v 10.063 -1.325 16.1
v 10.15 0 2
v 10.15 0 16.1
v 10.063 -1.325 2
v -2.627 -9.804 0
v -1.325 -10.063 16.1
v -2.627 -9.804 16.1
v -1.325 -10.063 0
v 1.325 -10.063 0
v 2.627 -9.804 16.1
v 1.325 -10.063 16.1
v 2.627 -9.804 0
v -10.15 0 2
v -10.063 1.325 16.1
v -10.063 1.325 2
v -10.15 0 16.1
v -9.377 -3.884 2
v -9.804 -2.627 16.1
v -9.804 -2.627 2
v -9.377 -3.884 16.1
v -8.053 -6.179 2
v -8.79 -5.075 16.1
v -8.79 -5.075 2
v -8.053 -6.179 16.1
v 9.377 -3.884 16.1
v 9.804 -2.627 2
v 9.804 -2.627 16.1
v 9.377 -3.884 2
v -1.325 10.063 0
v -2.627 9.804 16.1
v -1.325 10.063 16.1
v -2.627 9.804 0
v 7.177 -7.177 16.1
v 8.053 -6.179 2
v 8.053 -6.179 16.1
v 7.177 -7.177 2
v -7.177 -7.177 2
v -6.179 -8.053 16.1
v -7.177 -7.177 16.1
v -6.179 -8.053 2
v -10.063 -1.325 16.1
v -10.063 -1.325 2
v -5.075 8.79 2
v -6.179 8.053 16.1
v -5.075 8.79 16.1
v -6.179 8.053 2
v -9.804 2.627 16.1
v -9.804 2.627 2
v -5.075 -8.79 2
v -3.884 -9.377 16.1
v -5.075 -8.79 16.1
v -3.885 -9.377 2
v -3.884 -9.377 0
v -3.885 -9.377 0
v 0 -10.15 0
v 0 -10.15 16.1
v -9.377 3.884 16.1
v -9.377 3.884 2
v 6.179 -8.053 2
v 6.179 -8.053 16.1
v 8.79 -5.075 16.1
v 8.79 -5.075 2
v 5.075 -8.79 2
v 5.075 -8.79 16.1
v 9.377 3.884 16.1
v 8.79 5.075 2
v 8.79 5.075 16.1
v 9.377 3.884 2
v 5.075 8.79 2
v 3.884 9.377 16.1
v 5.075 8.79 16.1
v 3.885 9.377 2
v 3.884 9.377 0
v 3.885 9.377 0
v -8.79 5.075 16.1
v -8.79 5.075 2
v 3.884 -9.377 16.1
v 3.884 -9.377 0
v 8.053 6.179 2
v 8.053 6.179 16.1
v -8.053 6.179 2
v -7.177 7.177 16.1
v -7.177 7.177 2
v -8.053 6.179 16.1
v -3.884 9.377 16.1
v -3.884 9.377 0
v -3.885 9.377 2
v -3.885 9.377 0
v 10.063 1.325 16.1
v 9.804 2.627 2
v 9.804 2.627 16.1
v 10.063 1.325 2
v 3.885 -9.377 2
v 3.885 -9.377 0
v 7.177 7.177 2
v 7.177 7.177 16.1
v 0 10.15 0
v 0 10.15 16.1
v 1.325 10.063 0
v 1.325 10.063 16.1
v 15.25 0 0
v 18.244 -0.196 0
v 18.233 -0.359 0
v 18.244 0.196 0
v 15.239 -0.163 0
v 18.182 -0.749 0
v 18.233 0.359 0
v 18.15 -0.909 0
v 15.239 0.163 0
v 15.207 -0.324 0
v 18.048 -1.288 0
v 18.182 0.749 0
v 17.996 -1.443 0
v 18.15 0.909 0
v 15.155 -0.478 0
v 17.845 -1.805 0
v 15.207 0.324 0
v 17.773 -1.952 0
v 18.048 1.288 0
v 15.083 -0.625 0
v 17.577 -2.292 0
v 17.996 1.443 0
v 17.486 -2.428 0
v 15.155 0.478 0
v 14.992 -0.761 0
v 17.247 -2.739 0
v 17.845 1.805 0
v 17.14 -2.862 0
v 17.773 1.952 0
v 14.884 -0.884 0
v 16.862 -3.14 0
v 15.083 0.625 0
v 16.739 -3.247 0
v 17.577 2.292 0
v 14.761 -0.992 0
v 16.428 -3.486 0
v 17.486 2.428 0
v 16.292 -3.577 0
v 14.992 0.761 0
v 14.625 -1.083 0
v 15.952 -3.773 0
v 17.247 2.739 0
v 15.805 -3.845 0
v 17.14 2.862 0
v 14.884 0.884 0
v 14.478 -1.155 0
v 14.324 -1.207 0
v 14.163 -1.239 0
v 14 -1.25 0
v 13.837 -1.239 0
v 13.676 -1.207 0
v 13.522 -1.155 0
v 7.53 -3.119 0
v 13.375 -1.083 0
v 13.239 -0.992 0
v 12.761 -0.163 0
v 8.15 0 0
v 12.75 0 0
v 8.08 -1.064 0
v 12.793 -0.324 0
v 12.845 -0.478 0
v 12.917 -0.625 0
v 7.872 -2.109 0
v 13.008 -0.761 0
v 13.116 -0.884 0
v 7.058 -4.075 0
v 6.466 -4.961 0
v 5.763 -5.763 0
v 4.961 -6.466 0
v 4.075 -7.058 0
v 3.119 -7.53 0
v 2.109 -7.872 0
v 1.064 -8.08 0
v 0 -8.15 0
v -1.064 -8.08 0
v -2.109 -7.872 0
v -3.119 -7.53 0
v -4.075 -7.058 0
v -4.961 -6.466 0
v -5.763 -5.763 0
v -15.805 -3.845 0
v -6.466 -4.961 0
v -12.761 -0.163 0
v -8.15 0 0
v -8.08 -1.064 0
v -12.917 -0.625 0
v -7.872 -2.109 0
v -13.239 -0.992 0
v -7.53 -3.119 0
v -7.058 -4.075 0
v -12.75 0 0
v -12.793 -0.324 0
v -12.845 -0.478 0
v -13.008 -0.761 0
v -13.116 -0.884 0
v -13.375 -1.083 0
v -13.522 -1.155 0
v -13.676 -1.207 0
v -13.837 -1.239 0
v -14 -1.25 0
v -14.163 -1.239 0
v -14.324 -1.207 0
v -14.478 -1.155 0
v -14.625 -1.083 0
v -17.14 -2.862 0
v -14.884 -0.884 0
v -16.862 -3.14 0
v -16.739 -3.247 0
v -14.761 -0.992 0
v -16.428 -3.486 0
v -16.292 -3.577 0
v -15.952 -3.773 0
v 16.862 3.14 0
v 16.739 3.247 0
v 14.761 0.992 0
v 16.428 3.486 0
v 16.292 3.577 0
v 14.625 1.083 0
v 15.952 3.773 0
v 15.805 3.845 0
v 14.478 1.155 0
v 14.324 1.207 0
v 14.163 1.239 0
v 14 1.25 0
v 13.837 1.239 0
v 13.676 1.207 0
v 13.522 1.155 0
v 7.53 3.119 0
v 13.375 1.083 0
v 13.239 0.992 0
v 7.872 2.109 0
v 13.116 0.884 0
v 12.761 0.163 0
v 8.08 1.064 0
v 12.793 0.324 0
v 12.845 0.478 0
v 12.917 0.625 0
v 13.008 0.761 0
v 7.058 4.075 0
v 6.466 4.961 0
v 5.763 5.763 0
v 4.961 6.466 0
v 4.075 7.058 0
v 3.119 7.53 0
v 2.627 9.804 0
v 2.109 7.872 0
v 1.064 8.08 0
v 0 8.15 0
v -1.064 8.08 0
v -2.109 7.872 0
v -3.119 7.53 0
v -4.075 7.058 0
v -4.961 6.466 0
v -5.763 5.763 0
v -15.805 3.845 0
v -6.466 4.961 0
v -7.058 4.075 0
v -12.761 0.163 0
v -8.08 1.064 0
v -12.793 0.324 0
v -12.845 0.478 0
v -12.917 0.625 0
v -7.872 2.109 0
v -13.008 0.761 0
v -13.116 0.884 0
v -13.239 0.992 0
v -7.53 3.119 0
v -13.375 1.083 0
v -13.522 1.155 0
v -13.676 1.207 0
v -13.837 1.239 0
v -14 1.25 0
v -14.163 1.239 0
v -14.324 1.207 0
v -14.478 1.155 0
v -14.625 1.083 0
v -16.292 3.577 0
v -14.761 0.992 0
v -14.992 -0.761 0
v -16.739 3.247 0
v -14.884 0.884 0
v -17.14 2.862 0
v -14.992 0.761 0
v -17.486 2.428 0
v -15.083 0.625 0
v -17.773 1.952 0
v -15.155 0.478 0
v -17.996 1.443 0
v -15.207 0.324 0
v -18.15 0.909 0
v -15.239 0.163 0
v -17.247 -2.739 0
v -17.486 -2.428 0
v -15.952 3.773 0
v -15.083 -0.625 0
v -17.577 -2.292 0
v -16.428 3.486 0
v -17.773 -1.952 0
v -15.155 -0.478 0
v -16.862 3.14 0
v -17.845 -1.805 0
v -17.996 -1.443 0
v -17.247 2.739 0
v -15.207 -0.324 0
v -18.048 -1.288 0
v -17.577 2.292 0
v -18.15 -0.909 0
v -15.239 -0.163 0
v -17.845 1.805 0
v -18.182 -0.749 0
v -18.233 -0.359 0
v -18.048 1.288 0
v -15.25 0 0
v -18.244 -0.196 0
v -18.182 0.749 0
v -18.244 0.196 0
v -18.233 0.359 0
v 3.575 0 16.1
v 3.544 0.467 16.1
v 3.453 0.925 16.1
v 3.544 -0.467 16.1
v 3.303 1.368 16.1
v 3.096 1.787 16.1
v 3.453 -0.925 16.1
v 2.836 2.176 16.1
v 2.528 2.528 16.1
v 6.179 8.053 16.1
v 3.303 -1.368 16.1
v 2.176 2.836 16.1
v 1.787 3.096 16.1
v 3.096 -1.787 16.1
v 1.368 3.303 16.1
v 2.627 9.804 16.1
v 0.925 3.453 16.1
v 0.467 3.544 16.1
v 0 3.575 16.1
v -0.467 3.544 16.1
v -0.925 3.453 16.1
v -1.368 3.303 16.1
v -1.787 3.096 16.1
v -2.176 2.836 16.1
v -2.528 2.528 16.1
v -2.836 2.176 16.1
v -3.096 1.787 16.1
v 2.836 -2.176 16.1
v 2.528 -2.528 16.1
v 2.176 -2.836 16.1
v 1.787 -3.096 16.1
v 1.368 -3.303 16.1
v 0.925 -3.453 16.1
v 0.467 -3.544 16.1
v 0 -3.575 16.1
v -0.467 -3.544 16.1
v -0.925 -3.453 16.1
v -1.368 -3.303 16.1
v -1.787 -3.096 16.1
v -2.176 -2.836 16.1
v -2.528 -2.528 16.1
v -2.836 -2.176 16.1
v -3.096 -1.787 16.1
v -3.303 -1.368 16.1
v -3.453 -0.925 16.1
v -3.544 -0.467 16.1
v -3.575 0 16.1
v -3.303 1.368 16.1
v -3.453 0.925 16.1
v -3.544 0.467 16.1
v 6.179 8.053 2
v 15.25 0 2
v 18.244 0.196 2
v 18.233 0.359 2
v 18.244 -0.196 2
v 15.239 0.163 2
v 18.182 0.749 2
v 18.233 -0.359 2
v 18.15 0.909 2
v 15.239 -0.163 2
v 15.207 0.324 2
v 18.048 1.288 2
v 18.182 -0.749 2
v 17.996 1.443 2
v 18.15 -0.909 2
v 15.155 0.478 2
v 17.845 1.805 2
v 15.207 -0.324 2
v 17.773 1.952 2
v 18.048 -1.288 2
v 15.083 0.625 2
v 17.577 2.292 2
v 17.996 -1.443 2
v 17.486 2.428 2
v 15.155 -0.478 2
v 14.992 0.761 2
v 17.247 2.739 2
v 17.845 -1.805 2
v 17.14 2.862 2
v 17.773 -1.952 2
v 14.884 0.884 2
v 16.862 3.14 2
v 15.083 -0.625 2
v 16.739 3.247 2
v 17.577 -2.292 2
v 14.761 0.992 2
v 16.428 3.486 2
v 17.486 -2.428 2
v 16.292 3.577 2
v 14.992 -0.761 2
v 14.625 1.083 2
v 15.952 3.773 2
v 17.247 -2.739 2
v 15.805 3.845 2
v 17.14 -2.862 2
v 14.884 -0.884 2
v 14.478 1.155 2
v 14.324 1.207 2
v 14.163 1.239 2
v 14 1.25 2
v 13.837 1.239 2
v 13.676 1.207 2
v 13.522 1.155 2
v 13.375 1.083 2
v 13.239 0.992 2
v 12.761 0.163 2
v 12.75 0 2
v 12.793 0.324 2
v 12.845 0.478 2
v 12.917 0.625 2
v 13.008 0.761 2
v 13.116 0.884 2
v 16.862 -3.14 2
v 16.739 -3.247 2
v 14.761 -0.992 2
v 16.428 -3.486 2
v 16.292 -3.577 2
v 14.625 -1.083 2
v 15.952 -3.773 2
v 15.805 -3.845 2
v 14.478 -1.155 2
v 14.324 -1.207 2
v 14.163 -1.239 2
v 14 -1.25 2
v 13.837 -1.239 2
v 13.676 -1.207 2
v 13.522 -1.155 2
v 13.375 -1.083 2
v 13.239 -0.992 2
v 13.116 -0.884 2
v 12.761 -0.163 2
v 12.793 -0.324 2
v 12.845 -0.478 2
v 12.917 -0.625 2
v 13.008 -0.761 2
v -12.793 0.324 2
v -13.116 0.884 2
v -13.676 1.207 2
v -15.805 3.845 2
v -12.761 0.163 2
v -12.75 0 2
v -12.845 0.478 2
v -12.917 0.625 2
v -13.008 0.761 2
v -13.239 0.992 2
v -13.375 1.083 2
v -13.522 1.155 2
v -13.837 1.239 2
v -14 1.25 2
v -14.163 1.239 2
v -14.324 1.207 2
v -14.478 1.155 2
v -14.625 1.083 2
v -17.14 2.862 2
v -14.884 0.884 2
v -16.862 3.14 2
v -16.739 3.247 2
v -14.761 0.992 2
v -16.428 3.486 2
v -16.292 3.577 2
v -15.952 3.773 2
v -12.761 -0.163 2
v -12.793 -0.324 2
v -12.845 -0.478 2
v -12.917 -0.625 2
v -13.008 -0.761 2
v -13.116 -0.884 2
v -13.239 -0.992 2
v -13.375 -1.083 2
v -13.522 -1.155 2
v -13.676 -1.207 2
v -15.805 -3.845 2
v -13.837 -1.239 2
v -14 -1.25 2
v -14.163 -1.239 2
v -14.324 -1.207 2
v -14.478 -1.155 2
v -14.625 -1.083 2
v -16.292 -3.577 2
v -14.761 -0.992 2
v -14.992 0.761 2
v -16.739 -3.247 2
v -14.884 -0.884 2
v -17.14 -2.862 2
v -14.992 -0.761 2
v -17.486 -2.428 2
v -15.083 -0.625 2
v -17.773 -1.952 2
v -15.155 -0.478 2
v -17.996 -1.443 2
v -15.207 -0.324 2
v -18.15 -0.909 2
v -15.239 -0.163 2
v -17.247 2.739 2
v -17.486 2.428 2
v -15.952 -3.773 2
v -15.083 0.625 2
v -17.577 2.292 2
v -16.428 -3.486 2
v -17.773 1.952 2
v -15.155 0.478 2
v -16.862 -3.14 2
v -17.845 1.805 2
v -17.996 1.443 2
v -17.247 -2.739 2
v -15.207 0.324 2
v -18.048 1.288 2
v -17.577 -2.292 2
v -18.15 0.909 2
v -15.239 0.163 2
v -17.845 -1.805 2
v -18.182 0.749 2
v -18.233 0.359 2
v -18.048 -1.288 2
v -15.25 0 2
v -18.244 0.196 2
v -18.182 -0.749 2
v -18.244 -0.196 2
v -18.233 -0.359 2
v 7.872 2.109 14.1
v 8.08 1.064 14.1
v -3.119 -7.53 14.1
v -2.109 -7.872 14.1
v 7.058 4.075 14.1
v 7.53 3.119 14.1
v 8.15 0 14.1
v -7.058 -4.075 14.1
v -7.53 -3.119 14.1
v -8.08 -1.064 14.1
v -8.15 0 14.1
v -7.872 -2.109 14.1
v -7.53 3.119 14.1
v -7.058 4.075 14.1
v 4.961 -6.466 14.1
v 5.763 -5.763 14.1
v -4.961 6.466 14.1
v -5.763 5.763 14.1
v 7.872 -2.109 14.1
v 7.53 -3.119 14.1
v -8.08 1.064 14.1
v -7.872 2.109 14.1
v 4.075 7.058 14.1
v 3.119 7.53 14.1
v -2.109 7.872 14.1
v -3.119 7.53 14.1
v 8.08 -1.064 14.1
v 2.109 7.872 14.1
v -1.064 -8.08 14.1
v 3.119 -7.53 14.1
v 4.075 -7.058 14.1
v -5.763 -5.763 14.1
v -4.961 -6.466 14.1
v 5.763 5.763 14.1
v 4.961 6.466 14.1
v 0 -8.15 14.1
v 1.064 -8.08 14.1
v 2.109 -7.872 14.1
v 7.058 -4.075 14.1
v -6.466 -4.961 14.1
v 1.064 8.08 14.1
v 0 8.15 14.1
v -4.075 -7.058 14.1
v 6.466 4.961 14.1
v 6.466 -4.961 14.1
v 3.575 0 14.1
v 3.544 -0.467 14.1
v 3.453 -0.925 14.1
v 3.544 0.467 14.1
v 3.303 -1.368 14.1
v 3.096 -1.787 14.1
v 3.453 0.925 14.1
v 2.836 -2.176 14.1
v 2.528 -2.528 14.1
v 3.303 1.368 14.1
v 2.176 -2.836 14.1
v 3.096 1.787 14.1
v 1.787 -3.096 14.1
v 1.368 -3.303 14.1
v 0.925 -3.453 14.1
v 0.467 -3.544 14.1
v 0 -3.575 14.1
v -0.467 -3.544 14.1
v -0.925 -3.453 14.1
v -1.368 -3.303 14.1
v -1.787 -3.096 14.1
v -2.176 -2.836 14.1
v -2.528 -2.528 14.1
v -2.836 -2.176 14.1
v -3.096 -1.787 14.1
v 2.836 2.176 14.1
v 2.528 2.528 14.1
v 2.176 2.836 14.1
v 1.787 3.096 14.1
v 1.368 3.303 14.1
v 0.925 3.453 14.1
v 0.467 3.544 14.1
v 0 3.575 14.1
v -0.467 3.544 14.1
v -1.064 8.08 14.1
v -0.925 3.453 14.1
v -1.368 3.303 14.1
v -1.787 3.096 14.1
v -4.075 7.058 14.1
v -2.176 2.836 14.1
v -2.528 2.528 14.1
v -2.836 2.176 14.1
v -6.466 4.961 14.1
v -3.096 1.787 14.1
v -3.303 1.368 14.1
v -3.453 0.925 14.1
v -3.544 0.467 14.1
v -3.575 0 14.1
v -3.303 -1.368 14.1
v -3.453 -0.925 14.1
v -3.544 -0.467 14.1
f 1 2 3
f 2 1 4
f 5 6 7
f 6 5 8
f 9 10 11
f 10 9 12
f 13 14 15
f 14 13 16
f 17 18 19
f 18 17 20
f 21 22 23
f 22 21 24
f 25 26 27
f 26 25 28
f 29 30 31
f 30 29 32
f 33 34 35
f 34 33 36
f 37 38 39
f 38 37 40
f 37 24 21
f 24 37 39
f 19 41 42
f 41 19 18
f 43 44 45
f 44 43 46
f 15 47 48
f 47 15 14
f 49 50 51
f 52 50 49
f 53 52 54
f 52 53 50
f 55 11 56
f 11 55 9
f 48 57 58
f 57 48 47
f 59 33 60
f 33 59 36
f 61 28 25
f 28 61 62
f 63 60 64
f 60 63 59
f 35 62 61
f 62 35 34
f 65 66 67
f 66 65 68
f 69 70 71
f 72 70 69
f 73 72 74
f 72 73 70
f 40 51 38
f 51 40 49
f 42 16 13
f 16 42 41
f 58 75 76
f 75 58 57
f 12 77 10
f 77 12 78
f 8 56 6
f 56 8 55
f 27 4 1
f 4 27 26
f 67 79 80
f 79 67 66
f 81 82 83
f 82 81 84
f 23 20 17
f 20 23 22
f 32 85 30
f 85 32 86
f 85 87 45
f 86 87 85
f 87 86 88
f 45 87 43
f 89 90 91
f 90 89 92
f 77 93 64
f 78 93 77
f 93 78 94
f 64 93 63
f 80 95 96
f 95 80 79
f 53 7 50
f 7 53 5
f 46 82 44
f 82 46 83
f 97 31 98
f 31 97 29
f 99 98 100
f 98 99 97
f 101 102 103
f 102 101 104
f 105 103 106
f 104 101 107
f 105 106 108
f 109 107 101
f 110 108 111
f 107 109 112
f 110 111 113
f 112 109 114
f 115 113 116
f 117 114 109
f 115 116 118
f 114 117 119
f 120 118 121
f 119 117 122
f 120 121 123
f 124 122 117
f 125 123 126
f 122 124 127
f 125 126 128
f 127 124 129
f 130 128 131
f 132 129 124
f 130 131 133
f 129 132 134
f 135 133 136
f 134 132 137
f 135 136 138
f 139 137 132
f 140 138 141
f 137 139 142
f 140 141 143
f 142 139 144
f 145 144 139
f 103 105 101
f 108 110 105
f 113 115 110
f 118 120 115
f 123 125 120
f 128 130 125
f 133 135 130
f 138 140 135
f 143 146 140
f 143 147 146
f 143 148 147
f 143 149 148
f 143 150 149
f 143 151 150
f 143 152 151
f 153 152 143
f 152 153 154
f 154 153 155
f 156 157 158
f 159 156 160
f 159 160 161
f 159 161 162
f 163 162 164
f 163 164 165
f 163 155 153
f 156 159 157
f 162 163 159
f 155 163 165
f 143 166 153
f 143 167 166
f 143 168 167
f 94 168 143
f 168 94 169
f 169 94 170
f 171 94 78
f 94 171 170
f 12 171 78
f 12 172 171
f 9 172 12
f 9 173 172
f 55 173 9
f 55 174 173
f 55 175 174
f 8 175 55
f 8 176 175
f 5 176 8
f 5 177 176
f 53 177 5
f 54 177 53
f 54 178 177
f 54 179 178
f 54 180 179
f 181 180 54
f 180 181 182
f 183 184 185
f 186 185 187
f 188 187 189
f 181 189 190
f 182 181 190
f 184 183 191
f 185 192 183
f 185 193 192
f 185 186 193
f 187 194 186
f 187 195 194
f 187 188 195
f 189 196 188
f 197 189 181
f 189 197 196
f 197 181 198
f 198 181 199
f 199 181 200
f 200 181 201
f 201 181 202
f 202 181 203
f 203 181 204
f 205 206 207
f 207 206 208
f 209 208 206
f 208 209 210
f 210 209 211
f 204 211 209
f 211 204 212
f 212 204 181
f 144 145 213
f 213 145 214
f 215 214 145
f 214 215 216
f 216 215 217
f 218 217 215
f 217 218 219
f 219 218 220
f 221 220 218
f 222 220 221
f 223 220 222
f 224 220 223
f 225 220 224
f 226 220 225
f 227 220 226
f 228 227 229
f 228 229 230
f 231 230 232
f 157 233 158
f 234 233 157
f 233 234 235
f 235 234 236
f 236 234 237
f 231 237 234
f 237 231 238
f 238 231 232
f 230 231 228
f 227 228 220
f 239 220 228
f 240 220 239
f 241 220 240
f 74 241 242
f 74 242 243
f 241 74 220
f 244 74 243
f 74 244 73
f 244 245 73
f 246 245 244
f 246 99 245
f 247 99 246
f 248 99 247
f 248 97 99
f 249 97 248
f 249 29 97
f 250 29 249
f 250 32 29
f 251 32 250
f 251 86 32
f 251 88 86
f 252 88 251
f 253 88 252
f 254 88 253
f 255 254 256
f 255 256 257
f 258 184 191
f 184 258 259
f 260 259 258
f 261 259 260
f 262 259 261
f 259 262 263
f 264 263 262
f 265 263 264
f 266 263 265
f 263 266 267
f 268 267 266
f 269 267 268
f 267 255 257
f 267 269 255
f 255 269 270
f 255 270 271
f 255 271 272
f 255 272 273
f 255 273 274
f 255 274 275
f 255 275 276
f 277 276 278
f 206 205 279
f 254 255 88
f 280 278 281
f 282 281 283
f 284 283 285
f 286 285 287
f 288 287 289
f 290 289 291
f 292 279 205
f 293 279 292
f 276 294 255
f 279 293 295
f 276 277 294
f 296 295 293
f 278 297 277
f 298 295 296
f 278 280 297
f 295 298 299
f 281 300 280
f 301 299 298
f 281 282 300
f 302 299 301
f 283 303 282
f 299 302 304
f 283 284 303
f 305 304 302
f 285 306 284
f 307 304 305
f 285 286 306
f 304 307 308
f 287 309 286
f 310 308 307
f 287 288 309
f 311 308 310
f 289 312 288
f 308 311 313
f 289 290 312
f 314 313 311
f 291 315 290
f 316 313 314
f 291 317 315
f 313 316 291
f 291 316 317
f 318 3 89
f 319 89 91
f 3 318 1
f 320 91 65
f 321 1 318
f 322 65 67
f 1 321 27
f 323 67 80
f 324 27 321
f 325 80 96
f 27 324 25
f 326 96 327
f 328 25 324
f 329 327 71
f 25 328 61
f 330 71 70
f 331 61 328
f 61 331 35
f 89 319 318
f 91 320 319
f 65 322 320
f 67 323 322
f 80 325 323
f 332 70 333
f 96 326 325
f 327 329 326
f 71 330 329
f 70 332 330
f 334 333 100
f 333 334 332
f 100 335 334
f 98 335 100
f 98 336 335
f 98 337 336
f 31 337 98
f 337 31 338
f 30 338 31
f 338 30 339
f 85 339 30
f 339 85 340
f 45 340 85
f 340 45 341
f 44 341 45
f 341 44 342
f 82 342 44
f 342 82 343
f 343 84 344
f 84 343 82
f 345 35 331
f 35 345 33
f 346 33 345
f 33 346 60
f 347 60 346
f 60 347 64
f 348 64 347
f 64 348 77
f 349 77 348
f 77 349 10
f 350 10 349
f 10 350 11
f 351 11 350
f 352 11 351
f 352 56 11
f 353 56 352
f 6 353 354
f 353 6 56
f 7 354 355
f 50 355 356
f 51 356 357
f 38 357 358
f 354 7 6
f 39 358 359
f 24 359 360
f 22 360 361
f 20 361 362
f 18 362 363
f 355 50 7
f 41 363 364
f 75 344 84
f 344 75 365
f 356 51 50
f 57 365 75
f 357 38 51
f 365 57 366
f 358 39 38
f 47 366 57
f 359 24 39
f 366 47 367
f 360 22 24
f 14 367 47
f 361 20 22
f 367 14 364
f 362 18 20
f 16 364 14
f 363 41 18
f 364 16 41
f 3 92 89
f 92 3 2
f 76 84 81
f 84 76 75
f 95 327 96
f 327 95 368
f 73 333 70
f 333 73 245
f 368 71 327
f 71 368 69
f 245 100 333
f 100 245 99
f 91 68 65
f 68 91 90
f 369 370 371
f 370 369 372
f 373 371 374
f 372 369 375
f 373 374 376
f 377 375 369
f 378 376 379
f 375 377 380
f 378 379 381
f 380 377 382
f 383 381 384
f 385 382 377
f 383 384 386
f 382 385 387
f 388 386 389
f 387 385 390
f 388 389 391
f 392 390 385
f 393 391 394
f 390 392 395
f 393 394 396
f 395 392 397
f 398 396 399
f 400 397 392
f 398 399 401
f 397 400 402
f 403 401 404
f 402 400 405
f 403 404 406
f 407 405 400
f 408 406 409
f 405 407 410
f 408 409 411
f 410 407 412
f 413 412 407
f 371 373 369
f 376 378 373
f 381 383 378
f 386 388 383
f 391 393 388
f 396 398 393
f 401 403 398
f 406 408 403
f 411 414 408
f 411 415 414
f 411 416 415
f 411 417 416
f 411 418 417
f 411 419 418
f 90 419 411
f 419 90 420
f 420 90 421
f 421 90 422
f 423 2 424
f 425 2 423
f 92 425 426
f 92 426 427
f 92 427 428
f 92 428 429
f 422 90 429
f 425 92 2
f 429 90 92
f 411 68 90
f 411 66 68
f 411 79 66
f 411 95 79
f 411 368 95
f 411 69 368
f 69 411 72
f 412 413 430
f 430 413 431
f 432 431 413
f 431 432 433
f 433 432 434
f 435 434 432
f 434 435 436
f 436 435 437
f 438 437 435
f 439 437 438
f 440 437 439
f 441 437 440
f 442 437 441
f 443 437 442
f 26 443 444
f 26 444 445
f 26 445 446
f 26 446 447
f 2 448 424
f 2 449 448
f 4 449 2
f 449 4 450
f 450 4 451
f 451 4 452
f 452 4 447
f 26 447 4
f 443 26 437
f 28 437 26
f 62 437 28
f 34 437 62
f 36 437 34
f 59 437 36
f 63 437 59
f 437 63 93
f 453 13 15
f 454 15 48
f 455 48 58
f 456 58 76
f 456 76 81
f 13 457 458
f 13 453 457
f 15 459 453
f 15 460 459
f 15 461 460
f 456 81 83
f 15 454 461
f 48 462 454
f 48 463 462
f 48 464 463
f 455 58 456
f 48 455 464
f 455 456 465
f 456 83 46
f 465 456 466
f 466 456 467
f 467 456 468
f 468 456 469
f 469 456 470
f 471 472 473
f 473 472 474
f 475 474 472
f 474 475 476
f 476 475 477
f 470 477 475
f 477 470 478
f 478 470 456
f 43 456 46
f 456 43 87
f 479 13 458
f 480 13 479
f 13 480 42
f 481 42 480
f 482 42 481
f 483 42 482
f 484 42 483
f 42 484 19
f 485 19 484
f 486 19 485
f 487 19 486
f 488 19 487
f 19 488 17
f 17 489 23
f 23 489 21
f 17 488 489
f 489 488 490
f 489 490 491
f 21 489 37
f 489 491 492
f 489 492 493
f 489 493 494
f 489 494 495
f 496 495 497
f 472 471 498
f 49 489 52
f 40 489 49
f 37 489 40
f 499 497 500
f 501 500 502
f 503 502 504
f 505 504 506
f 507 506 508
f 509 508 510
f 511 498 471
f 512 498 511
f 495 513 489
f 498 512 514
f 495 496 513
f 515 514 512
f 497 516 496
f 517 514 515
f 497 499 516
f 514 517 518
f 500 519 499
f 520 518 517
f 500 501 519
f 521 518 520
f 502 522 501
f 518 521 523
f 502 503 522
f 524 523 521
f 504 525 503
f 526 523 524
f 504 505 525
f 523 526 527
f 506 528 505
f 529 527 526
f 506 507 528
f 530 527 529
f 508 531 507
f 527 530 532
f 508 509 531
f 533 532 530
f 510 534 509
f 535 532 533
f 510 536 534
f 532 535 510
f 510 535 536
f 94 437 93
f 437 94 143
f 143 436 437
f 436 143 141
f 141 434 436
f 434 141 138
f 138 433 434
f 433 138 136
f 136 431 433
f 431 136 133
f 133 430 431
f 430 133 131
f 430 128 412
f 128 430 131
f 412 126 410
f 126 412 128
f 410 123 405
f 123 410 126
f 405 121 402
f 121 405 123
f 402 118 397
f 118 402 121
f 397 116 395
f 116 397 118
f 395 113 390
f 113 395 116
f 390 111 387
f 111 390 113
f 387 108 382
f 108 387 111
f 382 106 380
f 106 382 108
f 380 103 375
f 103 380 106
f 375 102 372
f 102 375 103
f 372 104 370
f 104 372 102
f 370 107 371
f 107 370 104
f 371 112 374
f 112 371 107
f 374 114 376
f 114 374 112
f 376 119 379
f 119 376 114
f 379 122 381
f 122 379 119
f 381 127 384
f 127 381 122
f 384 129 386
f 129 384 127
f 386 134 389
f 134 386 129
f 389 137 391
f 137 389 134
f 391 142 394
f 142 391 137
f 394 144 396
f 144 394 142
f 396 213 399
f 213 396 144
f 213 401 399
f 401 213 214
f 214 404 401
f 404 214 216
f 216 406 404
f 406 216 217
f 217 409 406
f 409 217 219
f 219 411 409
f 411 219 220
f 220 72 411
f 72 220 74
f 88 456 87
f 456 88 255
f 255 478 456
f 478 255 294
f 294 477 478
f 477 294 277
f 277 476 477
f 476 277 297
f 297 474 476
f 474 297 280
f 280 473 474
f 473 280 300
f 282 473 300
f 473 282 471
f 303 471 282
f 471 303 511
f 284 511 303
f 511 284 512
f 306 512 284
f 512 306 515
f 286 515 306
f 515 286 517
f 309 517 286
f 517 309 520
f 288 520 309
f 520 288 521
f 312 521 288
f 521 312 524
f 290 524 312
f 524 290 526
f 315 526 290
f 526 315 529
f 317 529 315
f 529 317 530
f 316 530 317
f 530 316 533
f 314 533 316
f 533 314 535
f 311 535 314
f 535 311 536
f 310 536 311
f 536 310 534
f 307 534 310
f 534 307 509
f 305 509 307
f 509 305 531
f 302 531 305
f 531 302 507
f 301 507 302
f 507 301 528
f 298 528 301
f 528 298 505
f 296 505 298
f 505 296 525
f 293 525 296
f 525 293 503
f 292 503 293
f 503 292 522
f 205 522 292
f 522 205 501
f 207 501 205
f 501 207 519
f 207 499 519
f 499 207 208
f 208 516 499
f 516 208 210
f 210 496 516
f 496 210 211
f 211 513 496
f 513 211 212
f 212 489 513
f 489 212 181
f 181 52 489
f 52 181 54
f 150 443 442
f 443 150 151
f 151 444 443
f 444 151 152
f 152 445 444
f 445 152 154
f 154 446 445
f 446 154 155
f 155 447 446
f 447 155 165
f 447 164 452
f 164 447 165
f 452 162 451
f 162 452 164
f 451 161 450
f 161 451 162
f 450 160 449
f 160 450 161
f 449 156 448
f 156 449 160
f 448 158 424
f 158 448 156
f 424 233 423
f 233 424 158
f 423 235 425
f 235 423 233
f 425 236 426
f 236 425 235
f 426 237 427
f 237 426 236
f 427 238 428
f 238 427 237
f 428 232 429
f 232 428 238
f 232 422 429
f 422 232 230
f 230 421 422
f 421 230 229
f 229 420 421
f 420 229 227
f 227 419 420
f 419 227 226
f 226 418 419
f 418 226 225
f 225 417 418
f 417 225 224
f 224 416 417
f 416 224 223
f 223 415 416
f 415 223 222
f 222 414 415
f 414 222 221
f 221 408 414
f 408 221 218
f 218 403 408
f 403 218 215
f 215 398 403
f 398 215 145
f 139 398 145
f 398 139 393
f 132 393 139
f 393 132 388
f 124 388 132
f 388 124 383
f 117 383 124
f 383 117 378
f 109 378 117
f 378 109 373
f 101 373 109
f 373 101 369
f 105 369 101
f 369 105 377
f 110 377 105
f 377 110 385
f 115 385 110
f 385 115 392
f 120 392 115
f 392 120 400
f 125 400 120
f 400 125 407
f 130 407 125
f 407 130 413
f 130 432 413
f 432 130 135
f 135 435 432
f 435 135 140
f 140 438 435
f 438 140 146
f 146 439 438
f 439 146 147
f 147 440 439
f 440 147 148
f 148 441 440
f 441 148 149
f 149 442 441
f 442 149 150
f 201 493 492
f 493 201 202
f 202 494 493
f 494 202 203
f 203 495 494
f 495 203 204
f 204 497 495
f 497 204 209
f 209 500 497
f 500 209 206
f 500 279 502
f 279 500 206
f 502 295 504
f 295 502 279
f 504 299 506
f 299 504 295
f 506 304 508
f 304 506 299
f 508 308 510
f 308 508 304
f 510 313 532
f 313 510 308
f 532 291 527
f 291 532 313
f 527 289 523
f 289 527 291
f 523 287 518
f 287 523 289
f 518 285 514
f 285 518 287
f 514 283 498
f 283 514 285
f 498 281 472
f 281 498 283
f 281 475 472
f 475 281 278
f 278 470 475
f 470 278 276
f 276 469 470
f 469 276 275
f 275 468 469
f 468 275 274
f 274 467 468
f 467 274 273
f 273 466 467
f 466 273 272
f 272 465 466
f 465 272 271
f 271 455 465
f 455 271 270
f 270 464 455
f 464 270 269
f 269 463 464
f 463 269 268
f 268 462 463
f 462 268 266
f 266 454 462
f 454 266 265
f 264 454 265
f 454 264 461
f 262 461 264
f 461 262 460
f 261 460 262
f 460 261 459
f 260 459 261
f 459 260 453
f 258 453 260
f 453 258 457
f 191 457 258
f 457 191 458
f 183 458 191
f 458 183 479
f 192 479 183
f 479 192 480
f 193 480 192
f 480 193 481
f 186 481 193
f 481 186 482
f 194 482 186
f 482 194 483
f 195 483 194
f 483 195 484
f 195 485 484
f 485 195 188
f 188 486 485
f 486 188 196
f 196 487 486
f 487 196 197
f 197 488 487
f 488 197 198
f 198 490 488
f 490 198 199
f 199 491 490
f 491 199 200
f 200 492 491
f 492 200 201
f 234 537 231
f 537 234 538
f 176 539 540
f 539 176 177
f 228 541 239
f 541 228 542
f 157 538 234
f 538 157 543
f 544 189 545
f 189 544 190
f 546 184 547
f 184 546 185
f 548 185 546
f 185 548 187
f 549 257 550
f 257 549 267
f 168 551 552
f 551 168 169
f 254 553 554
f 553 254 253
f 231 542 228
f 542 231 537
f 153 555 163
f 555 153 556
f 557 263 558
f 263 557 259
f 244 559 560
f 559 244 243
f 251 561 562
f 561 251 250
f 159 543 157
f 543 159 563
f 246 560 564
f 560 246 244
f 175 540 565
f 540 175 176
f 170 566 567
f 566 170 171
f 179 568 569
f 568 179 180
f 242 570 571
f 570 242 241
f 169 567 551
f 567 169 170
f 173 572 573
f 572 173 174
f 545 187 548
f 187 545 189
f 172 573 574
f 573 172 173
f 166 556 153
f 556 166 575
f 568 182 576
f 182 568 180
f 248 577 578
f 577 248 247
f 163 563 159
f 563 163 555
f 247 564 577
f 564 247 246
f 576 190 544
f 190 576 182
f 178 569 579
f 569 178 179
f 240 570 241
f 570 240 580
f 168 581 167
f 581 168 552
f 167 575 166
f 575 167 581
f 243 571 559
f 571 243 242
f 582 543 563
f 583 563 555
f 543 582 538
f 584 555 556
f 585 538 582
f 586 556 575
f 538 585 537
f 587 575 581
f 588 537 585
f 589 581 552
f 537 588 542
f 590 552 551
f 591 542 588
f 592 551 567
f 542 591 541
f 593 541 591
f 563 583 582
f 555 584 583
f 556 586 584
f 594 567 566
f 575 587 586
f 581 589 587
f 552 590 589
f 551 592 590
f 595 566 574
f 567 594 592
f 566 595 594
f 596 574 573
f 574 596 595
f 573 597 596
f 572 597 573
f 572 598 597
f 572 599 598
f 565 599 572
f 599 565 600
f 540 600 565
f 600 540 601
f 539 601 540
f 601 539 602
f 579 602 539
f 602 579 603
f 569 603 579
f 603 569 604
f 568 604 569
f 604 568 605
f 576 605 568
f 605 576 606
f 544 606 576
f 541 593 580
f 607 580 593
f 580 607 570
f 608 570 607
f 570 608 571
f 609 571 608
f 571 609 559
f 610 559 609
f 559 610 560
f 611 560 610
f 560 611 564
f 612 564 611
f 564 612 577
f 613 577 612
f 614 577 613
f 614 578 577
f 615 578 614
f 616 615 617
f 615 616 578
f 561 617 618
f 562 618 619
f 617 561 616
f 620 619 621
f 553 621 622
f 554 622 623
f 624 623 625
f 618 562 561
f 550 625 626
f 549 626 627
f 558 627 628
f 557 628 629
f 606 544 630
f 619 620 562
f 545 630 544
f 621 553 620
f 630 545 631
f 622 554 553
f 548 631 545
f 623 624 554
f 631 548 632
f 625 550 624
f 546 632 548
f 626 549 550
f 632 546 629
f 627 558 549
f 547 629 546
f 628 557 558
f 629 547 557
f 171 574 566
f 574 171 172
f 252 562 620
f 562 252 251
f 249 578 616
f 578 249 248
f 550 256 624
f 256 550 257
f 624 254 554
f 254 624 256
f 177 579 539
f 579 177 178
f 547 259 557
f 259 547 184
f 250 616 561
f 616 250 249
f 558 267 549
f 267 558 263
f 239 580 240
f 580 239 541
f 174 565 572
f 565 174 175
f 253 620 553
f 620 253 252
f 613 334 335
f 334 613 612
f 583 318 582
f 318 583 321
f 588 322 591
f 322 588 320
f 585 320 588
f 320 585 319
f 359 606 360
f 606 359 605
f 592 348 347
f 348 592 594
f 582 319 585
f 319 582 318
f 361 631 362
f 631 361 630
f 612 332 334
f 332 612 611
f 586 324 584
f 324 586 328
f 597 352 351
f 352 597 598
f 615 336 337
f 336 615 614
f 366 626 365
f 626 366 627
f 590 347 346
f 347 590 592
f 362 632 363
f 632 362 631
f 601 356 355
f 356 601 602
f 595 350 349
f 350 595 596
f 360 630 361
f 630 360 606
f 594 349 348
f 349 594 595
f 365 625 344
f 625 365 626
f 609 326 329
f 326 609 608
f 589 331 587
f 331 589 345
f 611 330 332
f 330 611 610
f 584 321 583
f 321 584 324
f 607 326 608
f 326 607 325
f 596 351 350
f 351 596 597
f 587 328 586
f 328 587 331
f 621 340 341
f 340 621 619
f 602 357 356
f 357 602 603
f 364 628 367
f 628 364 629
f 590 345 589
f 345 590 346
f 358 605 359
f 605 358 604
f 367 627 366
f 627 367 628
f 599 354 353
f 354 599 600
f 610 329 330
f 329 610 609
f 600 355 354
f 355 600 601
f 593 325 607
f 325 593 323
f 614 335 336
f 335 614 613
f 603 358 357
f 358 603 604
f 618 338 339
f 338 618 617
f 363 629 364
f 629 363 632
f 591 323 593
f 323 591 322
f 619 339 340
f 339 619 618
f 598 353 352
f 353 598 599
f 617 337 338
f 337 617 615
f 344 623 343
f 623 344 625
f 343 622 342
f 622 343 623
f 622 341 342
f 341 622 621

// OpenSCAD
// Robot cam-car chassis
$fn = 48;

battery_wid = 67.0;
battery_len = 112.0;
battery_h = 13.5;

chassis_len = 124.0+18.5;
chassis_h = 40.0;
chassis_thick = 2.0;//1.2;
chassis_rounding = chassis_thick;
chassis_wid = 87.0;//battery_wid+chassis_thick*2;

chassis_lid_thick = 4.0;
chassis_spacing = 0.5;
webcam_notch_offset = -20.0;
power_notch_offset = -20.0;

charge_notch_offset_h = 25.0;
charge_notch_offset_v = 0.0;

// New cylindrical motor gearbox
gearbox_dia = 16.3;
gearbox_h = 14.1;
gearbox_hole_dia = 7.15;
gearbox_hole_h = 2.0;
gearbox_cover_thick = chassis_thick;
// Existing Dimensions
spacing = 0.15;
motor_h = 11.8+spacing;//10.0+spacing;
motor_wid = 15.3+spacing;//12.0+spacing;
motor_len = 18.9;//16.0;
motor_screw_dist = 28.0;//22.5;
motor_screw_dia = 2.5;
motor_screw_len = 7.0;

battery_stilt_dist = 10.0;
battery_stilt_thick = 1.2;

led_dia = 5.3;
led_h = 7.5;
headlight_offset = 20.0;
num_headlights = 2;
headlight_wall_dist = 25.0;

wheel_offset = -chassis_len/5;
wheel_dia = 42.5;
robot_axle_z = wheel_dia/2;
robot_axel_x = chassis_len-wheel_offset;
robot_tilt_angle = atan(robot_axle_z/robot_axel_x)/1.5;

module motorGearbox() {
    linear_extrude(gearbox_h, convexity=6)
    circle(d=gearbox_dia);
    translate([0,0,gearbox_h])
    linear_extrude(gearbox_hole_h)
    circle(d=gearbox_hole_dia);
}

module motorCapHoles2D() {
    translate([motor_screw_dist/2, 0, 0])
    circle(d=motor_screw_dia);
    translate([-motor_screw_dist/2, 0, 0])
    circle(d=motor_screw_dia);
}

module motorCapOutline() {
    linear_extrude(gearbox_cover_thick, convexity=6)
    difference() {
        hull() {
            offset(gearbox_cover_thick*1.5)
            motorCapHoles2D();
            //linear_extrude(gearbox_cover_thick)
            circle(d=gearbox_dia+2*gearbox_cover_thick);
        }
        motorCapHoles2D();
    }
}

module motorCap() {
    difference() {
        union() {
            linear_extrude(gearbox_h+gearbox_cover_thick)
            circle(d=gearbox_dia+2*gearbox_cover_thick);
            motorCapOutline();
        }
        motorGearbox();
    }
}

motorCap();

module emptyChassis(extra=0.0) {
    difference() {
        linear_extrude(chassis_h, convexity=6)
        offset(chassis_rounding) offset(-chassis_rounding)
        square([chassis_len, chassis_wid], center=true);
        translate([0,0,chassis_thick])
        linear_extrude(chassis_h-chassis_thick, convexity=6)
        square([chassis_len-2*chassis_thick-extra, chassis_wid-2*chassis_thick-extra], center=true);
    }
}

module motor() {
    rotate([0,0,90])
    translate([-motor_len/2,0,motor_h/2])
    rotate([0,90,0])
    linear_extrude(motor_len, convexity=6)
    intersection() {
    circle(d=motor_wid);
    square([motor_h, motor_wid*2], center=true);
    }
}

module motorScrews() {
    translate([motor_screw_dist/2, motor_len/2, motor_h/2])
    rotate([90,0,0])
    cylinder(d=motor_screw_dia, h=motor_len);
    translate([-motor_screw_dist/2, motor_len/2, motor_h/2])
    rotate([90,0,0])
    cylinder(d=motor_screw_dia, h=motor_len);
}

module motorAndScrews() {
    motor();
    motorScrews();
}

module motorHoles() {
    translate([wheel_offset,chassis_wid/2-motor_len/2,chassis_thick])
    motorAndScrews();
    translate([wheel_offset,-(chassis_wid/2-motor_len/2),chassis_thick])
    motorAndScrews();
}

module batteryStilt() {
    translate([0,0,chassis_h-battery_h+chassis_thick])
    rotate([-90,0,90])
    linear_extrude(battery_stilt_thick, convexity=6)
    polygon([[0,0], [battery_stilt_dist, 0], [0, battery_stilt_dist]]);
    //cube([1,10,chassis_h-battery_h], center=true);
}

module batteryStilts() {
    translate([chassis_len/4,-chassis_wid/2, 0])
    batteryStilt();
    translate([-chassis_len/4,-chassis_wid/2, 0])
    batteryStilt();
    rotate([0,0,180]) {
    translate([chassis_len/4,-chassis_wid/2, 0])
    batteryStilt();
    translate([-chassis_len/4,-chassis_wid/2, 0])
    batteryStilt();
    }
}

module headlightLed() {
    translate([-chassis_len/2-led_h/2, 0, led_dia/2+headlight_offset])
    rotate([0,90-robot_tilt_angle,0])
    cylinder(d=led_dia, h=led_h);
}

module headlightHoles() {
    translate([0,-(chassis_wid-2*headlight_wall_dist)*(1-(1/num_headlights))/2,0])
    for (i=[0:num_headlights-1]) {
        div_part = (chassis_wid-(headlight_wall_dist*2)) / num_headlights;
        translate([0, i*div_part, 0])
        headlightLed();
    }
}

cable_dia = 4.0;
module cableSlot() {
    rotate([90,0,0]) {
        cylinder(d=cable_dia, h=chassis_thick*3);
        translate([0,cable_dia/4,chassis_thick])
        cube([cable_dia,cable_dia/2,chassis_thick*3], center=true);
    }
}

module completeChassis() {
    difference() {
        emptyChassis();
        motorHoles();
        #headlightHoles();
        translate([webcam_notch_offset,-chassis_wid/2+chassis_thick*1.5,chassis_h-chassis_thick/1.3])
        #cableSlot(); // Webcam
        translate([chassis_len/2-chassis_thick*1.5,power_notch_offset,chassis_h-chassis_thick/1.3])
        rotate([0,0,90])
        #cableSlot(); // Power
        translate([-chassis_len/2, charge_notch_offset_h, charge_notch_offset_v+chassis_thick+cable_dia/2])
        rotate([0,0,90])
        #cableSlot();
        translate([-chassis_len/2, -charge_notch_offset_h, charge_notch_offset_v+chassis_thick+cable_dia/2])
        rotate([0,0,90])
        #cableSlot();
    }
    //translate([chassis_len-battery_len, 0, 0])
    //batteryStilts();
}

module chassisLid() {
    difference() {
        translate([0,0,chassis_h-chassis_lid_thick/2.0])
        linear_extrude(chassis_lid_thick, convexity=6)
        offset(chassis_rounding) offset(-chassis_rounding) 
        square([chassis_len, chassis_wid], center=true);
        emptyChassis(extra=chassis_spacing);
        translate([webcam_notch_offset,-chassis_wid/2+chassis_thick*3,chassis_h-chassis_thick/1.25])
        scale([1,2,1])
        #cableSlot(); // Webcam
        translate([chassis_len/2-chassis_thick*3,power_notch_offset,chassis_h-chassis_thick/1.25])
        scale([2,1,1])
        rotate([0,0,90])
        #cableSlot(); // Power
    }
}

//motorAndScrews();
//completeChassis();
//    translate([0,0,10])
//chassisLid();
